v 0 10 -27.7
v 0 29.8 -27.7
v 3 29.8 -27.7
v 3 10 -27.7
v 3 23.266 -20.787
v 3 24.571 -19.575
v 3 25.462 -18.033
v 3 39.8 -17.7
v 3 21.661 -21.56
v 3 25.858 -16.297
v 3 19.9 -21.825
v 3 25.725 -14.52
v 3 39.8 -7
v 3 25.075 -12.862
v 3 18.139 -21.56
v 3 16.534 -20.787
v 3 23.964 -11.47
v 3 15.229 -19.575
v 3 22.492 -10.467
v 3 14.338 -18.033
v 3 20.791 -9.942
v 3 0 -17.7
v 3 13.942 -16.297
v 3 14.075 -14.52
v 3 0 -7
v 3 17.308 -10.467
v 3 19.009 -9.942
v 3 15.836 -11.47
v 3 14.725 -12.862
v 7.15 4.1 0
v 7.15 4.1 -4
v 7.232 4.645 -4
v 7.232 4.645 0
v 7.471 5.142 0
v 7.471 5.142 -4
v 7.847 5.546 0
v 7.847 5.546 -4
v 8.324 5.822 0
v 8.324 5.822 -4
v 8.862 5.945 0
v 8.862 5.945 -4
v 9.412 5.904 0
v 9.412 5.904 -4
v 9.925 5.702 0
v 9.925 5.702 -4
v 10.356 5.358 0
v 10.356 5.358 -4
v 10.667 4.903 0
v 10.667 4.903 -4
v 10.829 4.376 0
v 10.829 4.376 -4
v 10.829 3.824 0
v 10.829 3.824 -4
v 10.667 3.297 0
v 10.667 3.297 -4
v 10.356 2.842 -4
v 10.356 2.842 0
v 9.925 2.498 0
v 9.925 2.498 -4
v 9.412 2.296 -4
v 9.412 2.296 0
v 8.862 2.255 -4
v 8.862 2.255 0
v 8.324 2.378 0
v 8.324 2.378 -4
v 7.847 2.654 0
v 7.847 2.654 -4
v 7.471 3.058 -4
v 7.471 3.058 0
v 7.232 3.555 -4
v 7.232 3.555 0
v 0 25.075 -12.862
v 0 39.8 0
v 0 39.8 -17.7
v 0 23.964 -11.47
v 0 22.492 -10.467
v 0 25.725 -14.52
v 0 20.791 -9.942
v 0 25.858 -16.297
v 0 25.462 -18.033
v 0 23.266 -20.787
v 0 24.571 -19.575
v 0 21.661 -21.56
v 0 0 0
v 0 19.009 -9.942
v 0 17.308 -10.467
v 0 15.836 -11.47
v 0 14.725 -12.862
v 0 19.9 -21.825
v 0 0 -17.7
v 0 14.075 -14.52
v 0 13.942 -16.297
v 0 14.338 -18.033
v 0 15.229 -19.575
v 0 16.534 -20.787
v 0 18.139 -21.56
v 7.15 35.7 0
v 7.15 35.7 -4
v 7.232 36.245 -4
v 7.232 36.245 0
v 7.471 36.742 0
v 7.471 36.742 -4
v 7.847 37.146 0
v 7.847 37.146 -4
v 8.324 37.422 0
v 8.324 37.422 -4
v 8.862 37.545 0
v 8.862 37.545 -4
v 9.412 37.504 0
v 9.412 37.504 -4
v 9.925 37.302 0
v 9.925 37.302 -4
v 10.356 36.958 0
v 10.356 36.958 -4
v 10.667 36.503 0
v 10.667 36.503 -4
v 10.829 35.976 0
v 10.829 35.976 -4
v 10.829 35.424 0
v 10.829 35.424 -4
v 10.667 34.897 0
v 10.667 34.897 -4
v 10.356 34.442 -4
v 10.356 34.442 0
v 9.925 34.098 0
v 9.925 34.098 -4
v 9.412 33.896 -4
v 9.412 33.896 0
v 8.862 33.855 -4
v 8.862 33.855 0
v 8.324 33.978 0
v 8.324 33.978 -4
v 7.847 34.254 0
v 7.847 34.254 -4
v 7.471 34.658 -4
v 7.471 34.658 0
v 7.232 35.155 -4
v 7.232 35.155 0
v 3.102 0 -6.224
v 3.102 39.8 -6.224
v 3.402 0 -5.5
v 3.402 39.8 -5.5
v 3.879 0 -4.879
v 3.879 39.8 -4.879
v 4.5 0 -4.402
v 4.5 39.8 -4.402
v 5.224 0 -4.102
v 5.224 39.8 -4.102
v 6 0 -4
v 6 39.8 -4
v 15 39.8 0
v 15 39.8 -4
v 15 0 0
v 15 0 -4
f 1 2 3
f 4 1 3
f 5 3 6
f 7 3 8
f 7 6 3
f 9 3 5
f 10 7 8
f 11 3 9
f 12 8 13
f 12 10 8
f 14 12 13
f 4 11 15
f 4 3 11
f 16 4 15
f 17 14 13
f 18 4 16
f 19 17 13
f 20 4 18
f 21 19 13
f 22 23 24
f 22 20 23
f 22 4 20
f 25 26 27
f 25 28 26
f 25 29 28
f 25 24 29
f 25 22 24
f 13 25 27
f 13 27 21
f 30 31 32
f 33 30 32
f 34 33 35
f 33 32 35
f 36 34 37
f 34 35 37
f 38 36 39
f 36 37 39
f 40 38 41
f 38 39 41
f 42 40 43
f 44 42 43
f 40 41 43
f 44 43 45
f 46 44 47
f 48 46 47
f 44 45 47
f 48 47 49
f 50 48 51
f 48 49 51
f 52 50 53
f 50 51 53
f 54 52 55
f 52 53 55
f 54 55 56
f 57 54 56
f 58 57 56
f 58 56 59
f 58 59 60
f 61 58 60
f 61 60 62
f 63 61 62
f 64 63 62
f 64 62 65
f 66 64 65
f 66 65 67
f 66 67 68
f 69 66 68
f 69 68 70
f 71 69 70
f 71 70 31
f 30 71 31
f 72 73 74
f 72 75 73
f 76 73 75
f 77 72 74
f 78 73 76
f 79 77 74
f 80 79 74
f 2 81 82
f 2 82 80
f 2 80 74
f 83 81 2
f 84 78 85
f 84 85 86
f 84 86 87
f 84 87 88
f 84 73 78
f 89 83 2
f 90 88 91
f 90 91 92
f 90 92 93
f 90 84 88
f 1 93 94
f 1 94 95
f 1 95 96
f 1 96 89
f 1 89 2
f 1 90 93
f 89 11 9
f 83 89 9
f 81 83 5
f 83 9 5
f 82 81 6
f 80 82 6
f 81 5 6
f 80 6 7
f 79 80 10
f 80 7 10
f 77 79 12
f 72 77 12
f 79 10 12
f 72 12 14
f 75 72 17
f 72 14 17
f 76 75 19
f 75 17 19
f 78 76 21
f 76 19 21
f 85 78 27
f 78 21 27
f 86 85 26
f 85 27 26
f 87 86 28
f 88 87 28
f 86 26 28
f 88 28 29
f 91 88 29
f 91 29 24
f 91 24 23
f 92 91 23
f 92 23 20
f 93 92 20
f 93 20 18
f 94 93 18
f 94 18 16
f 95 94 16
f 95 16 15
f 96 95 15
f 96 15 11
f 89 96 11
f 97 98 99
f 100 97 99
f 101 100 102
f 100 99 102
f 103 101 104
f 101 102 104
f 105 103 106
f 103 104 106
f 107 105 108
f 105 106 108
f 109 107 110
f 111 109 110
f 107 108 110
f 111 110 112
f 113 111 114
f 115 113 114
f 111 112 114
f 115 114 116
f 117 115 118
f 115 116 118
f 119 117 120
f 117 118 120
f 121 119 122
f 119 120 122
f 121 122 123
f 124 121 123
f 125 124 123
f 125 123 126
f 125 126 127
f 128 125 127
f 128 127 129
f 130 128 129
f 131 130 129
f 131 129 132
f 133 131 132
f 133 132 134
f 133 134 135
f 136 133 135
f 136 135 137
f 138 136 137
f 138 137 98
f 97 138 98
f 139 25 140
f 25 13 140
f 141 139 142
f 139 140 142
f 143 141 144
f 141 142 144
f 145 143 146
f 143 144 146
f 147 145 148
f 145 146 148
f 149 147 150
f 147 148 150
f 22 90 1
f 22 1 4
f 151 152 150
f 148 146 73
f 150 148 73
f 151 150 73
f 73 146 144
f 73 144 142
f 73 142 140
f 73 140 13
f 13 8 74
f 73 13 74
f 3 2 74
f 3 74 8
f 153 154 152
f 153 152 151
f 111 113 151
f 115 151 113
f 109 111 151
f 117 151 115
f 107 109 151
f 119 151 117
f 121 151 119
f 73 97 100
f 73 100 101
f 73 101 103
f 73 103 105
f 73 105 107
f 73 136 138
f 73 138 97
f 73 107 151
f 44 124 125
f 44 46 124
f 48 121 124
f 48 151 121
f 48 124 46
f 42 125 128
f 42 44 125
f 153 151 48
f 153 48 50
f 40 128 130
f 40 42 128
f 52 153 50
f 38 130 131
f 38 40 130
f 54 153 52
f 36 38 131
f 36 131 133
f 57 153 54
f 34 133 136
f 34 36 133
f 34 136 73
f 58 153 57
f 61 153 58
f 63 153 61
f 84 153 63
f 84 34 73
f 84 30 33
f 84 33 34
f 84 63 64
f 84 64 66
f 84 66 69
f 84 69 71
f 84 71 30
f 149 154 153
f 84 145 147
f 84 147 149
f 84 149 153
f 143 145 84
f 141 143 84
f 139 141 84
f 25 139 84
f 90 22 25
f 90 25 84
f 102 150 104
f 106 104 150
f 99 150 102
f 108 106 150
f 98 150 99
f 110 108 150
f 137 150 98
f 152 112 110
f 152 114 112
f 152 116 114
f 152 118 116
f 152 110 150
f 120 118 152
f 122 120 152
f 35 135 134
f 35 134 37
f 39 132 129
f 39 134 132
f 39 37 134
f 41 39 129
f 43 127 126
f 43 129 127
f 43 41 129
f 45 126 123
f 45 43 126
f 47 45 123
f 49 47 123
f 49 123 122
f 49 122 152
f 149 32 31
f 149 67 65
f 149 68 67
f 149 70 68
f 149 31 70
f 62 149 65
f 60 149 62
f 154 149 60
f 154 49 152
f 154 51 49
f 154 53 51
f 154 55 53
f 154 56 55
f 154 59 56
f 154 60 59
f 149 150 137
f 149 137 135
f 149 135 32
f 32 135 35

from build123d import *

# Parameters (mm, degrees)
BOSS_EXTRUDE1_DEPTH = 39.8
SKETCH2_R           = 1.85
CUT_EXTRUDE1_DEPTH  = 39.8
SKETCH3_R           = 5.975
CUT_EXTRUDE2_DEPTH  = 39.8
CHAMFER1_SIZE       = 10
FILLET1_R           = 3


with BuildPart() as part:
    # Sketch1 → Boss-Extrude1 (new body)
    with BuildSketch(Plane(origin=(0, 0, 0), x_dir=(1, 0, 0), z_dir=(0, 1, 0))):
        Polygon((0, 0), (0, 27.7), (3, 27.7), (3, 4), (15, 4), (15, 0), align=None)
    extrude(amount=BOSS_EXTRUDE1_DEPTH)

    # Sketch2 → Cut-Extrude1 (cut)
    with BuildSketch(Plane(origin=(0, 0, -4), x_dir=(-1, 0, 0), z_dir=(0, 0, -1))):
        with Locations((-9, 35.7)):
            Circle(SKETCH2_R)
        with Locations((-9, 4.1)):
            Circle(SKETCH2_R)
    extrude(amount=-CUT_EXTRUDE1_DEPTH, mode=Mode.SUBTRACT)

    # Sketch3 → Cut-Extrude2 (cut)
    with BuildSketch(Plane(origin=(3, 0, 0), x_dir=(0, 0, -1), z_dir=(1, 0, 0))):
        with Locations((15.85, 19.9)):
            Circle(SKETCH3_R)
    extrude(amount=-CUT_EXTRUDE2_DEPTH, mode=Mode.SUBTRACT)

    # Chamfer1
    chamfer1_edges = [part.edges().sort_by_distance(p)[0] for p in [
        (1.5, 39.8, -27.7),
        (1.5, 0, -27.7),
    ]]
    chamfer(chamfer1_edges, length=CHAMFER1_SIZE)

    # Fillet1
    fillet1_edges = [part.edges().sort_by_distance(p)[0] for p in [
        (3, 19.9, -4),
    ]]
    fillet(fillet1_edges, radius=FILLET1_R)


solid = part.part
